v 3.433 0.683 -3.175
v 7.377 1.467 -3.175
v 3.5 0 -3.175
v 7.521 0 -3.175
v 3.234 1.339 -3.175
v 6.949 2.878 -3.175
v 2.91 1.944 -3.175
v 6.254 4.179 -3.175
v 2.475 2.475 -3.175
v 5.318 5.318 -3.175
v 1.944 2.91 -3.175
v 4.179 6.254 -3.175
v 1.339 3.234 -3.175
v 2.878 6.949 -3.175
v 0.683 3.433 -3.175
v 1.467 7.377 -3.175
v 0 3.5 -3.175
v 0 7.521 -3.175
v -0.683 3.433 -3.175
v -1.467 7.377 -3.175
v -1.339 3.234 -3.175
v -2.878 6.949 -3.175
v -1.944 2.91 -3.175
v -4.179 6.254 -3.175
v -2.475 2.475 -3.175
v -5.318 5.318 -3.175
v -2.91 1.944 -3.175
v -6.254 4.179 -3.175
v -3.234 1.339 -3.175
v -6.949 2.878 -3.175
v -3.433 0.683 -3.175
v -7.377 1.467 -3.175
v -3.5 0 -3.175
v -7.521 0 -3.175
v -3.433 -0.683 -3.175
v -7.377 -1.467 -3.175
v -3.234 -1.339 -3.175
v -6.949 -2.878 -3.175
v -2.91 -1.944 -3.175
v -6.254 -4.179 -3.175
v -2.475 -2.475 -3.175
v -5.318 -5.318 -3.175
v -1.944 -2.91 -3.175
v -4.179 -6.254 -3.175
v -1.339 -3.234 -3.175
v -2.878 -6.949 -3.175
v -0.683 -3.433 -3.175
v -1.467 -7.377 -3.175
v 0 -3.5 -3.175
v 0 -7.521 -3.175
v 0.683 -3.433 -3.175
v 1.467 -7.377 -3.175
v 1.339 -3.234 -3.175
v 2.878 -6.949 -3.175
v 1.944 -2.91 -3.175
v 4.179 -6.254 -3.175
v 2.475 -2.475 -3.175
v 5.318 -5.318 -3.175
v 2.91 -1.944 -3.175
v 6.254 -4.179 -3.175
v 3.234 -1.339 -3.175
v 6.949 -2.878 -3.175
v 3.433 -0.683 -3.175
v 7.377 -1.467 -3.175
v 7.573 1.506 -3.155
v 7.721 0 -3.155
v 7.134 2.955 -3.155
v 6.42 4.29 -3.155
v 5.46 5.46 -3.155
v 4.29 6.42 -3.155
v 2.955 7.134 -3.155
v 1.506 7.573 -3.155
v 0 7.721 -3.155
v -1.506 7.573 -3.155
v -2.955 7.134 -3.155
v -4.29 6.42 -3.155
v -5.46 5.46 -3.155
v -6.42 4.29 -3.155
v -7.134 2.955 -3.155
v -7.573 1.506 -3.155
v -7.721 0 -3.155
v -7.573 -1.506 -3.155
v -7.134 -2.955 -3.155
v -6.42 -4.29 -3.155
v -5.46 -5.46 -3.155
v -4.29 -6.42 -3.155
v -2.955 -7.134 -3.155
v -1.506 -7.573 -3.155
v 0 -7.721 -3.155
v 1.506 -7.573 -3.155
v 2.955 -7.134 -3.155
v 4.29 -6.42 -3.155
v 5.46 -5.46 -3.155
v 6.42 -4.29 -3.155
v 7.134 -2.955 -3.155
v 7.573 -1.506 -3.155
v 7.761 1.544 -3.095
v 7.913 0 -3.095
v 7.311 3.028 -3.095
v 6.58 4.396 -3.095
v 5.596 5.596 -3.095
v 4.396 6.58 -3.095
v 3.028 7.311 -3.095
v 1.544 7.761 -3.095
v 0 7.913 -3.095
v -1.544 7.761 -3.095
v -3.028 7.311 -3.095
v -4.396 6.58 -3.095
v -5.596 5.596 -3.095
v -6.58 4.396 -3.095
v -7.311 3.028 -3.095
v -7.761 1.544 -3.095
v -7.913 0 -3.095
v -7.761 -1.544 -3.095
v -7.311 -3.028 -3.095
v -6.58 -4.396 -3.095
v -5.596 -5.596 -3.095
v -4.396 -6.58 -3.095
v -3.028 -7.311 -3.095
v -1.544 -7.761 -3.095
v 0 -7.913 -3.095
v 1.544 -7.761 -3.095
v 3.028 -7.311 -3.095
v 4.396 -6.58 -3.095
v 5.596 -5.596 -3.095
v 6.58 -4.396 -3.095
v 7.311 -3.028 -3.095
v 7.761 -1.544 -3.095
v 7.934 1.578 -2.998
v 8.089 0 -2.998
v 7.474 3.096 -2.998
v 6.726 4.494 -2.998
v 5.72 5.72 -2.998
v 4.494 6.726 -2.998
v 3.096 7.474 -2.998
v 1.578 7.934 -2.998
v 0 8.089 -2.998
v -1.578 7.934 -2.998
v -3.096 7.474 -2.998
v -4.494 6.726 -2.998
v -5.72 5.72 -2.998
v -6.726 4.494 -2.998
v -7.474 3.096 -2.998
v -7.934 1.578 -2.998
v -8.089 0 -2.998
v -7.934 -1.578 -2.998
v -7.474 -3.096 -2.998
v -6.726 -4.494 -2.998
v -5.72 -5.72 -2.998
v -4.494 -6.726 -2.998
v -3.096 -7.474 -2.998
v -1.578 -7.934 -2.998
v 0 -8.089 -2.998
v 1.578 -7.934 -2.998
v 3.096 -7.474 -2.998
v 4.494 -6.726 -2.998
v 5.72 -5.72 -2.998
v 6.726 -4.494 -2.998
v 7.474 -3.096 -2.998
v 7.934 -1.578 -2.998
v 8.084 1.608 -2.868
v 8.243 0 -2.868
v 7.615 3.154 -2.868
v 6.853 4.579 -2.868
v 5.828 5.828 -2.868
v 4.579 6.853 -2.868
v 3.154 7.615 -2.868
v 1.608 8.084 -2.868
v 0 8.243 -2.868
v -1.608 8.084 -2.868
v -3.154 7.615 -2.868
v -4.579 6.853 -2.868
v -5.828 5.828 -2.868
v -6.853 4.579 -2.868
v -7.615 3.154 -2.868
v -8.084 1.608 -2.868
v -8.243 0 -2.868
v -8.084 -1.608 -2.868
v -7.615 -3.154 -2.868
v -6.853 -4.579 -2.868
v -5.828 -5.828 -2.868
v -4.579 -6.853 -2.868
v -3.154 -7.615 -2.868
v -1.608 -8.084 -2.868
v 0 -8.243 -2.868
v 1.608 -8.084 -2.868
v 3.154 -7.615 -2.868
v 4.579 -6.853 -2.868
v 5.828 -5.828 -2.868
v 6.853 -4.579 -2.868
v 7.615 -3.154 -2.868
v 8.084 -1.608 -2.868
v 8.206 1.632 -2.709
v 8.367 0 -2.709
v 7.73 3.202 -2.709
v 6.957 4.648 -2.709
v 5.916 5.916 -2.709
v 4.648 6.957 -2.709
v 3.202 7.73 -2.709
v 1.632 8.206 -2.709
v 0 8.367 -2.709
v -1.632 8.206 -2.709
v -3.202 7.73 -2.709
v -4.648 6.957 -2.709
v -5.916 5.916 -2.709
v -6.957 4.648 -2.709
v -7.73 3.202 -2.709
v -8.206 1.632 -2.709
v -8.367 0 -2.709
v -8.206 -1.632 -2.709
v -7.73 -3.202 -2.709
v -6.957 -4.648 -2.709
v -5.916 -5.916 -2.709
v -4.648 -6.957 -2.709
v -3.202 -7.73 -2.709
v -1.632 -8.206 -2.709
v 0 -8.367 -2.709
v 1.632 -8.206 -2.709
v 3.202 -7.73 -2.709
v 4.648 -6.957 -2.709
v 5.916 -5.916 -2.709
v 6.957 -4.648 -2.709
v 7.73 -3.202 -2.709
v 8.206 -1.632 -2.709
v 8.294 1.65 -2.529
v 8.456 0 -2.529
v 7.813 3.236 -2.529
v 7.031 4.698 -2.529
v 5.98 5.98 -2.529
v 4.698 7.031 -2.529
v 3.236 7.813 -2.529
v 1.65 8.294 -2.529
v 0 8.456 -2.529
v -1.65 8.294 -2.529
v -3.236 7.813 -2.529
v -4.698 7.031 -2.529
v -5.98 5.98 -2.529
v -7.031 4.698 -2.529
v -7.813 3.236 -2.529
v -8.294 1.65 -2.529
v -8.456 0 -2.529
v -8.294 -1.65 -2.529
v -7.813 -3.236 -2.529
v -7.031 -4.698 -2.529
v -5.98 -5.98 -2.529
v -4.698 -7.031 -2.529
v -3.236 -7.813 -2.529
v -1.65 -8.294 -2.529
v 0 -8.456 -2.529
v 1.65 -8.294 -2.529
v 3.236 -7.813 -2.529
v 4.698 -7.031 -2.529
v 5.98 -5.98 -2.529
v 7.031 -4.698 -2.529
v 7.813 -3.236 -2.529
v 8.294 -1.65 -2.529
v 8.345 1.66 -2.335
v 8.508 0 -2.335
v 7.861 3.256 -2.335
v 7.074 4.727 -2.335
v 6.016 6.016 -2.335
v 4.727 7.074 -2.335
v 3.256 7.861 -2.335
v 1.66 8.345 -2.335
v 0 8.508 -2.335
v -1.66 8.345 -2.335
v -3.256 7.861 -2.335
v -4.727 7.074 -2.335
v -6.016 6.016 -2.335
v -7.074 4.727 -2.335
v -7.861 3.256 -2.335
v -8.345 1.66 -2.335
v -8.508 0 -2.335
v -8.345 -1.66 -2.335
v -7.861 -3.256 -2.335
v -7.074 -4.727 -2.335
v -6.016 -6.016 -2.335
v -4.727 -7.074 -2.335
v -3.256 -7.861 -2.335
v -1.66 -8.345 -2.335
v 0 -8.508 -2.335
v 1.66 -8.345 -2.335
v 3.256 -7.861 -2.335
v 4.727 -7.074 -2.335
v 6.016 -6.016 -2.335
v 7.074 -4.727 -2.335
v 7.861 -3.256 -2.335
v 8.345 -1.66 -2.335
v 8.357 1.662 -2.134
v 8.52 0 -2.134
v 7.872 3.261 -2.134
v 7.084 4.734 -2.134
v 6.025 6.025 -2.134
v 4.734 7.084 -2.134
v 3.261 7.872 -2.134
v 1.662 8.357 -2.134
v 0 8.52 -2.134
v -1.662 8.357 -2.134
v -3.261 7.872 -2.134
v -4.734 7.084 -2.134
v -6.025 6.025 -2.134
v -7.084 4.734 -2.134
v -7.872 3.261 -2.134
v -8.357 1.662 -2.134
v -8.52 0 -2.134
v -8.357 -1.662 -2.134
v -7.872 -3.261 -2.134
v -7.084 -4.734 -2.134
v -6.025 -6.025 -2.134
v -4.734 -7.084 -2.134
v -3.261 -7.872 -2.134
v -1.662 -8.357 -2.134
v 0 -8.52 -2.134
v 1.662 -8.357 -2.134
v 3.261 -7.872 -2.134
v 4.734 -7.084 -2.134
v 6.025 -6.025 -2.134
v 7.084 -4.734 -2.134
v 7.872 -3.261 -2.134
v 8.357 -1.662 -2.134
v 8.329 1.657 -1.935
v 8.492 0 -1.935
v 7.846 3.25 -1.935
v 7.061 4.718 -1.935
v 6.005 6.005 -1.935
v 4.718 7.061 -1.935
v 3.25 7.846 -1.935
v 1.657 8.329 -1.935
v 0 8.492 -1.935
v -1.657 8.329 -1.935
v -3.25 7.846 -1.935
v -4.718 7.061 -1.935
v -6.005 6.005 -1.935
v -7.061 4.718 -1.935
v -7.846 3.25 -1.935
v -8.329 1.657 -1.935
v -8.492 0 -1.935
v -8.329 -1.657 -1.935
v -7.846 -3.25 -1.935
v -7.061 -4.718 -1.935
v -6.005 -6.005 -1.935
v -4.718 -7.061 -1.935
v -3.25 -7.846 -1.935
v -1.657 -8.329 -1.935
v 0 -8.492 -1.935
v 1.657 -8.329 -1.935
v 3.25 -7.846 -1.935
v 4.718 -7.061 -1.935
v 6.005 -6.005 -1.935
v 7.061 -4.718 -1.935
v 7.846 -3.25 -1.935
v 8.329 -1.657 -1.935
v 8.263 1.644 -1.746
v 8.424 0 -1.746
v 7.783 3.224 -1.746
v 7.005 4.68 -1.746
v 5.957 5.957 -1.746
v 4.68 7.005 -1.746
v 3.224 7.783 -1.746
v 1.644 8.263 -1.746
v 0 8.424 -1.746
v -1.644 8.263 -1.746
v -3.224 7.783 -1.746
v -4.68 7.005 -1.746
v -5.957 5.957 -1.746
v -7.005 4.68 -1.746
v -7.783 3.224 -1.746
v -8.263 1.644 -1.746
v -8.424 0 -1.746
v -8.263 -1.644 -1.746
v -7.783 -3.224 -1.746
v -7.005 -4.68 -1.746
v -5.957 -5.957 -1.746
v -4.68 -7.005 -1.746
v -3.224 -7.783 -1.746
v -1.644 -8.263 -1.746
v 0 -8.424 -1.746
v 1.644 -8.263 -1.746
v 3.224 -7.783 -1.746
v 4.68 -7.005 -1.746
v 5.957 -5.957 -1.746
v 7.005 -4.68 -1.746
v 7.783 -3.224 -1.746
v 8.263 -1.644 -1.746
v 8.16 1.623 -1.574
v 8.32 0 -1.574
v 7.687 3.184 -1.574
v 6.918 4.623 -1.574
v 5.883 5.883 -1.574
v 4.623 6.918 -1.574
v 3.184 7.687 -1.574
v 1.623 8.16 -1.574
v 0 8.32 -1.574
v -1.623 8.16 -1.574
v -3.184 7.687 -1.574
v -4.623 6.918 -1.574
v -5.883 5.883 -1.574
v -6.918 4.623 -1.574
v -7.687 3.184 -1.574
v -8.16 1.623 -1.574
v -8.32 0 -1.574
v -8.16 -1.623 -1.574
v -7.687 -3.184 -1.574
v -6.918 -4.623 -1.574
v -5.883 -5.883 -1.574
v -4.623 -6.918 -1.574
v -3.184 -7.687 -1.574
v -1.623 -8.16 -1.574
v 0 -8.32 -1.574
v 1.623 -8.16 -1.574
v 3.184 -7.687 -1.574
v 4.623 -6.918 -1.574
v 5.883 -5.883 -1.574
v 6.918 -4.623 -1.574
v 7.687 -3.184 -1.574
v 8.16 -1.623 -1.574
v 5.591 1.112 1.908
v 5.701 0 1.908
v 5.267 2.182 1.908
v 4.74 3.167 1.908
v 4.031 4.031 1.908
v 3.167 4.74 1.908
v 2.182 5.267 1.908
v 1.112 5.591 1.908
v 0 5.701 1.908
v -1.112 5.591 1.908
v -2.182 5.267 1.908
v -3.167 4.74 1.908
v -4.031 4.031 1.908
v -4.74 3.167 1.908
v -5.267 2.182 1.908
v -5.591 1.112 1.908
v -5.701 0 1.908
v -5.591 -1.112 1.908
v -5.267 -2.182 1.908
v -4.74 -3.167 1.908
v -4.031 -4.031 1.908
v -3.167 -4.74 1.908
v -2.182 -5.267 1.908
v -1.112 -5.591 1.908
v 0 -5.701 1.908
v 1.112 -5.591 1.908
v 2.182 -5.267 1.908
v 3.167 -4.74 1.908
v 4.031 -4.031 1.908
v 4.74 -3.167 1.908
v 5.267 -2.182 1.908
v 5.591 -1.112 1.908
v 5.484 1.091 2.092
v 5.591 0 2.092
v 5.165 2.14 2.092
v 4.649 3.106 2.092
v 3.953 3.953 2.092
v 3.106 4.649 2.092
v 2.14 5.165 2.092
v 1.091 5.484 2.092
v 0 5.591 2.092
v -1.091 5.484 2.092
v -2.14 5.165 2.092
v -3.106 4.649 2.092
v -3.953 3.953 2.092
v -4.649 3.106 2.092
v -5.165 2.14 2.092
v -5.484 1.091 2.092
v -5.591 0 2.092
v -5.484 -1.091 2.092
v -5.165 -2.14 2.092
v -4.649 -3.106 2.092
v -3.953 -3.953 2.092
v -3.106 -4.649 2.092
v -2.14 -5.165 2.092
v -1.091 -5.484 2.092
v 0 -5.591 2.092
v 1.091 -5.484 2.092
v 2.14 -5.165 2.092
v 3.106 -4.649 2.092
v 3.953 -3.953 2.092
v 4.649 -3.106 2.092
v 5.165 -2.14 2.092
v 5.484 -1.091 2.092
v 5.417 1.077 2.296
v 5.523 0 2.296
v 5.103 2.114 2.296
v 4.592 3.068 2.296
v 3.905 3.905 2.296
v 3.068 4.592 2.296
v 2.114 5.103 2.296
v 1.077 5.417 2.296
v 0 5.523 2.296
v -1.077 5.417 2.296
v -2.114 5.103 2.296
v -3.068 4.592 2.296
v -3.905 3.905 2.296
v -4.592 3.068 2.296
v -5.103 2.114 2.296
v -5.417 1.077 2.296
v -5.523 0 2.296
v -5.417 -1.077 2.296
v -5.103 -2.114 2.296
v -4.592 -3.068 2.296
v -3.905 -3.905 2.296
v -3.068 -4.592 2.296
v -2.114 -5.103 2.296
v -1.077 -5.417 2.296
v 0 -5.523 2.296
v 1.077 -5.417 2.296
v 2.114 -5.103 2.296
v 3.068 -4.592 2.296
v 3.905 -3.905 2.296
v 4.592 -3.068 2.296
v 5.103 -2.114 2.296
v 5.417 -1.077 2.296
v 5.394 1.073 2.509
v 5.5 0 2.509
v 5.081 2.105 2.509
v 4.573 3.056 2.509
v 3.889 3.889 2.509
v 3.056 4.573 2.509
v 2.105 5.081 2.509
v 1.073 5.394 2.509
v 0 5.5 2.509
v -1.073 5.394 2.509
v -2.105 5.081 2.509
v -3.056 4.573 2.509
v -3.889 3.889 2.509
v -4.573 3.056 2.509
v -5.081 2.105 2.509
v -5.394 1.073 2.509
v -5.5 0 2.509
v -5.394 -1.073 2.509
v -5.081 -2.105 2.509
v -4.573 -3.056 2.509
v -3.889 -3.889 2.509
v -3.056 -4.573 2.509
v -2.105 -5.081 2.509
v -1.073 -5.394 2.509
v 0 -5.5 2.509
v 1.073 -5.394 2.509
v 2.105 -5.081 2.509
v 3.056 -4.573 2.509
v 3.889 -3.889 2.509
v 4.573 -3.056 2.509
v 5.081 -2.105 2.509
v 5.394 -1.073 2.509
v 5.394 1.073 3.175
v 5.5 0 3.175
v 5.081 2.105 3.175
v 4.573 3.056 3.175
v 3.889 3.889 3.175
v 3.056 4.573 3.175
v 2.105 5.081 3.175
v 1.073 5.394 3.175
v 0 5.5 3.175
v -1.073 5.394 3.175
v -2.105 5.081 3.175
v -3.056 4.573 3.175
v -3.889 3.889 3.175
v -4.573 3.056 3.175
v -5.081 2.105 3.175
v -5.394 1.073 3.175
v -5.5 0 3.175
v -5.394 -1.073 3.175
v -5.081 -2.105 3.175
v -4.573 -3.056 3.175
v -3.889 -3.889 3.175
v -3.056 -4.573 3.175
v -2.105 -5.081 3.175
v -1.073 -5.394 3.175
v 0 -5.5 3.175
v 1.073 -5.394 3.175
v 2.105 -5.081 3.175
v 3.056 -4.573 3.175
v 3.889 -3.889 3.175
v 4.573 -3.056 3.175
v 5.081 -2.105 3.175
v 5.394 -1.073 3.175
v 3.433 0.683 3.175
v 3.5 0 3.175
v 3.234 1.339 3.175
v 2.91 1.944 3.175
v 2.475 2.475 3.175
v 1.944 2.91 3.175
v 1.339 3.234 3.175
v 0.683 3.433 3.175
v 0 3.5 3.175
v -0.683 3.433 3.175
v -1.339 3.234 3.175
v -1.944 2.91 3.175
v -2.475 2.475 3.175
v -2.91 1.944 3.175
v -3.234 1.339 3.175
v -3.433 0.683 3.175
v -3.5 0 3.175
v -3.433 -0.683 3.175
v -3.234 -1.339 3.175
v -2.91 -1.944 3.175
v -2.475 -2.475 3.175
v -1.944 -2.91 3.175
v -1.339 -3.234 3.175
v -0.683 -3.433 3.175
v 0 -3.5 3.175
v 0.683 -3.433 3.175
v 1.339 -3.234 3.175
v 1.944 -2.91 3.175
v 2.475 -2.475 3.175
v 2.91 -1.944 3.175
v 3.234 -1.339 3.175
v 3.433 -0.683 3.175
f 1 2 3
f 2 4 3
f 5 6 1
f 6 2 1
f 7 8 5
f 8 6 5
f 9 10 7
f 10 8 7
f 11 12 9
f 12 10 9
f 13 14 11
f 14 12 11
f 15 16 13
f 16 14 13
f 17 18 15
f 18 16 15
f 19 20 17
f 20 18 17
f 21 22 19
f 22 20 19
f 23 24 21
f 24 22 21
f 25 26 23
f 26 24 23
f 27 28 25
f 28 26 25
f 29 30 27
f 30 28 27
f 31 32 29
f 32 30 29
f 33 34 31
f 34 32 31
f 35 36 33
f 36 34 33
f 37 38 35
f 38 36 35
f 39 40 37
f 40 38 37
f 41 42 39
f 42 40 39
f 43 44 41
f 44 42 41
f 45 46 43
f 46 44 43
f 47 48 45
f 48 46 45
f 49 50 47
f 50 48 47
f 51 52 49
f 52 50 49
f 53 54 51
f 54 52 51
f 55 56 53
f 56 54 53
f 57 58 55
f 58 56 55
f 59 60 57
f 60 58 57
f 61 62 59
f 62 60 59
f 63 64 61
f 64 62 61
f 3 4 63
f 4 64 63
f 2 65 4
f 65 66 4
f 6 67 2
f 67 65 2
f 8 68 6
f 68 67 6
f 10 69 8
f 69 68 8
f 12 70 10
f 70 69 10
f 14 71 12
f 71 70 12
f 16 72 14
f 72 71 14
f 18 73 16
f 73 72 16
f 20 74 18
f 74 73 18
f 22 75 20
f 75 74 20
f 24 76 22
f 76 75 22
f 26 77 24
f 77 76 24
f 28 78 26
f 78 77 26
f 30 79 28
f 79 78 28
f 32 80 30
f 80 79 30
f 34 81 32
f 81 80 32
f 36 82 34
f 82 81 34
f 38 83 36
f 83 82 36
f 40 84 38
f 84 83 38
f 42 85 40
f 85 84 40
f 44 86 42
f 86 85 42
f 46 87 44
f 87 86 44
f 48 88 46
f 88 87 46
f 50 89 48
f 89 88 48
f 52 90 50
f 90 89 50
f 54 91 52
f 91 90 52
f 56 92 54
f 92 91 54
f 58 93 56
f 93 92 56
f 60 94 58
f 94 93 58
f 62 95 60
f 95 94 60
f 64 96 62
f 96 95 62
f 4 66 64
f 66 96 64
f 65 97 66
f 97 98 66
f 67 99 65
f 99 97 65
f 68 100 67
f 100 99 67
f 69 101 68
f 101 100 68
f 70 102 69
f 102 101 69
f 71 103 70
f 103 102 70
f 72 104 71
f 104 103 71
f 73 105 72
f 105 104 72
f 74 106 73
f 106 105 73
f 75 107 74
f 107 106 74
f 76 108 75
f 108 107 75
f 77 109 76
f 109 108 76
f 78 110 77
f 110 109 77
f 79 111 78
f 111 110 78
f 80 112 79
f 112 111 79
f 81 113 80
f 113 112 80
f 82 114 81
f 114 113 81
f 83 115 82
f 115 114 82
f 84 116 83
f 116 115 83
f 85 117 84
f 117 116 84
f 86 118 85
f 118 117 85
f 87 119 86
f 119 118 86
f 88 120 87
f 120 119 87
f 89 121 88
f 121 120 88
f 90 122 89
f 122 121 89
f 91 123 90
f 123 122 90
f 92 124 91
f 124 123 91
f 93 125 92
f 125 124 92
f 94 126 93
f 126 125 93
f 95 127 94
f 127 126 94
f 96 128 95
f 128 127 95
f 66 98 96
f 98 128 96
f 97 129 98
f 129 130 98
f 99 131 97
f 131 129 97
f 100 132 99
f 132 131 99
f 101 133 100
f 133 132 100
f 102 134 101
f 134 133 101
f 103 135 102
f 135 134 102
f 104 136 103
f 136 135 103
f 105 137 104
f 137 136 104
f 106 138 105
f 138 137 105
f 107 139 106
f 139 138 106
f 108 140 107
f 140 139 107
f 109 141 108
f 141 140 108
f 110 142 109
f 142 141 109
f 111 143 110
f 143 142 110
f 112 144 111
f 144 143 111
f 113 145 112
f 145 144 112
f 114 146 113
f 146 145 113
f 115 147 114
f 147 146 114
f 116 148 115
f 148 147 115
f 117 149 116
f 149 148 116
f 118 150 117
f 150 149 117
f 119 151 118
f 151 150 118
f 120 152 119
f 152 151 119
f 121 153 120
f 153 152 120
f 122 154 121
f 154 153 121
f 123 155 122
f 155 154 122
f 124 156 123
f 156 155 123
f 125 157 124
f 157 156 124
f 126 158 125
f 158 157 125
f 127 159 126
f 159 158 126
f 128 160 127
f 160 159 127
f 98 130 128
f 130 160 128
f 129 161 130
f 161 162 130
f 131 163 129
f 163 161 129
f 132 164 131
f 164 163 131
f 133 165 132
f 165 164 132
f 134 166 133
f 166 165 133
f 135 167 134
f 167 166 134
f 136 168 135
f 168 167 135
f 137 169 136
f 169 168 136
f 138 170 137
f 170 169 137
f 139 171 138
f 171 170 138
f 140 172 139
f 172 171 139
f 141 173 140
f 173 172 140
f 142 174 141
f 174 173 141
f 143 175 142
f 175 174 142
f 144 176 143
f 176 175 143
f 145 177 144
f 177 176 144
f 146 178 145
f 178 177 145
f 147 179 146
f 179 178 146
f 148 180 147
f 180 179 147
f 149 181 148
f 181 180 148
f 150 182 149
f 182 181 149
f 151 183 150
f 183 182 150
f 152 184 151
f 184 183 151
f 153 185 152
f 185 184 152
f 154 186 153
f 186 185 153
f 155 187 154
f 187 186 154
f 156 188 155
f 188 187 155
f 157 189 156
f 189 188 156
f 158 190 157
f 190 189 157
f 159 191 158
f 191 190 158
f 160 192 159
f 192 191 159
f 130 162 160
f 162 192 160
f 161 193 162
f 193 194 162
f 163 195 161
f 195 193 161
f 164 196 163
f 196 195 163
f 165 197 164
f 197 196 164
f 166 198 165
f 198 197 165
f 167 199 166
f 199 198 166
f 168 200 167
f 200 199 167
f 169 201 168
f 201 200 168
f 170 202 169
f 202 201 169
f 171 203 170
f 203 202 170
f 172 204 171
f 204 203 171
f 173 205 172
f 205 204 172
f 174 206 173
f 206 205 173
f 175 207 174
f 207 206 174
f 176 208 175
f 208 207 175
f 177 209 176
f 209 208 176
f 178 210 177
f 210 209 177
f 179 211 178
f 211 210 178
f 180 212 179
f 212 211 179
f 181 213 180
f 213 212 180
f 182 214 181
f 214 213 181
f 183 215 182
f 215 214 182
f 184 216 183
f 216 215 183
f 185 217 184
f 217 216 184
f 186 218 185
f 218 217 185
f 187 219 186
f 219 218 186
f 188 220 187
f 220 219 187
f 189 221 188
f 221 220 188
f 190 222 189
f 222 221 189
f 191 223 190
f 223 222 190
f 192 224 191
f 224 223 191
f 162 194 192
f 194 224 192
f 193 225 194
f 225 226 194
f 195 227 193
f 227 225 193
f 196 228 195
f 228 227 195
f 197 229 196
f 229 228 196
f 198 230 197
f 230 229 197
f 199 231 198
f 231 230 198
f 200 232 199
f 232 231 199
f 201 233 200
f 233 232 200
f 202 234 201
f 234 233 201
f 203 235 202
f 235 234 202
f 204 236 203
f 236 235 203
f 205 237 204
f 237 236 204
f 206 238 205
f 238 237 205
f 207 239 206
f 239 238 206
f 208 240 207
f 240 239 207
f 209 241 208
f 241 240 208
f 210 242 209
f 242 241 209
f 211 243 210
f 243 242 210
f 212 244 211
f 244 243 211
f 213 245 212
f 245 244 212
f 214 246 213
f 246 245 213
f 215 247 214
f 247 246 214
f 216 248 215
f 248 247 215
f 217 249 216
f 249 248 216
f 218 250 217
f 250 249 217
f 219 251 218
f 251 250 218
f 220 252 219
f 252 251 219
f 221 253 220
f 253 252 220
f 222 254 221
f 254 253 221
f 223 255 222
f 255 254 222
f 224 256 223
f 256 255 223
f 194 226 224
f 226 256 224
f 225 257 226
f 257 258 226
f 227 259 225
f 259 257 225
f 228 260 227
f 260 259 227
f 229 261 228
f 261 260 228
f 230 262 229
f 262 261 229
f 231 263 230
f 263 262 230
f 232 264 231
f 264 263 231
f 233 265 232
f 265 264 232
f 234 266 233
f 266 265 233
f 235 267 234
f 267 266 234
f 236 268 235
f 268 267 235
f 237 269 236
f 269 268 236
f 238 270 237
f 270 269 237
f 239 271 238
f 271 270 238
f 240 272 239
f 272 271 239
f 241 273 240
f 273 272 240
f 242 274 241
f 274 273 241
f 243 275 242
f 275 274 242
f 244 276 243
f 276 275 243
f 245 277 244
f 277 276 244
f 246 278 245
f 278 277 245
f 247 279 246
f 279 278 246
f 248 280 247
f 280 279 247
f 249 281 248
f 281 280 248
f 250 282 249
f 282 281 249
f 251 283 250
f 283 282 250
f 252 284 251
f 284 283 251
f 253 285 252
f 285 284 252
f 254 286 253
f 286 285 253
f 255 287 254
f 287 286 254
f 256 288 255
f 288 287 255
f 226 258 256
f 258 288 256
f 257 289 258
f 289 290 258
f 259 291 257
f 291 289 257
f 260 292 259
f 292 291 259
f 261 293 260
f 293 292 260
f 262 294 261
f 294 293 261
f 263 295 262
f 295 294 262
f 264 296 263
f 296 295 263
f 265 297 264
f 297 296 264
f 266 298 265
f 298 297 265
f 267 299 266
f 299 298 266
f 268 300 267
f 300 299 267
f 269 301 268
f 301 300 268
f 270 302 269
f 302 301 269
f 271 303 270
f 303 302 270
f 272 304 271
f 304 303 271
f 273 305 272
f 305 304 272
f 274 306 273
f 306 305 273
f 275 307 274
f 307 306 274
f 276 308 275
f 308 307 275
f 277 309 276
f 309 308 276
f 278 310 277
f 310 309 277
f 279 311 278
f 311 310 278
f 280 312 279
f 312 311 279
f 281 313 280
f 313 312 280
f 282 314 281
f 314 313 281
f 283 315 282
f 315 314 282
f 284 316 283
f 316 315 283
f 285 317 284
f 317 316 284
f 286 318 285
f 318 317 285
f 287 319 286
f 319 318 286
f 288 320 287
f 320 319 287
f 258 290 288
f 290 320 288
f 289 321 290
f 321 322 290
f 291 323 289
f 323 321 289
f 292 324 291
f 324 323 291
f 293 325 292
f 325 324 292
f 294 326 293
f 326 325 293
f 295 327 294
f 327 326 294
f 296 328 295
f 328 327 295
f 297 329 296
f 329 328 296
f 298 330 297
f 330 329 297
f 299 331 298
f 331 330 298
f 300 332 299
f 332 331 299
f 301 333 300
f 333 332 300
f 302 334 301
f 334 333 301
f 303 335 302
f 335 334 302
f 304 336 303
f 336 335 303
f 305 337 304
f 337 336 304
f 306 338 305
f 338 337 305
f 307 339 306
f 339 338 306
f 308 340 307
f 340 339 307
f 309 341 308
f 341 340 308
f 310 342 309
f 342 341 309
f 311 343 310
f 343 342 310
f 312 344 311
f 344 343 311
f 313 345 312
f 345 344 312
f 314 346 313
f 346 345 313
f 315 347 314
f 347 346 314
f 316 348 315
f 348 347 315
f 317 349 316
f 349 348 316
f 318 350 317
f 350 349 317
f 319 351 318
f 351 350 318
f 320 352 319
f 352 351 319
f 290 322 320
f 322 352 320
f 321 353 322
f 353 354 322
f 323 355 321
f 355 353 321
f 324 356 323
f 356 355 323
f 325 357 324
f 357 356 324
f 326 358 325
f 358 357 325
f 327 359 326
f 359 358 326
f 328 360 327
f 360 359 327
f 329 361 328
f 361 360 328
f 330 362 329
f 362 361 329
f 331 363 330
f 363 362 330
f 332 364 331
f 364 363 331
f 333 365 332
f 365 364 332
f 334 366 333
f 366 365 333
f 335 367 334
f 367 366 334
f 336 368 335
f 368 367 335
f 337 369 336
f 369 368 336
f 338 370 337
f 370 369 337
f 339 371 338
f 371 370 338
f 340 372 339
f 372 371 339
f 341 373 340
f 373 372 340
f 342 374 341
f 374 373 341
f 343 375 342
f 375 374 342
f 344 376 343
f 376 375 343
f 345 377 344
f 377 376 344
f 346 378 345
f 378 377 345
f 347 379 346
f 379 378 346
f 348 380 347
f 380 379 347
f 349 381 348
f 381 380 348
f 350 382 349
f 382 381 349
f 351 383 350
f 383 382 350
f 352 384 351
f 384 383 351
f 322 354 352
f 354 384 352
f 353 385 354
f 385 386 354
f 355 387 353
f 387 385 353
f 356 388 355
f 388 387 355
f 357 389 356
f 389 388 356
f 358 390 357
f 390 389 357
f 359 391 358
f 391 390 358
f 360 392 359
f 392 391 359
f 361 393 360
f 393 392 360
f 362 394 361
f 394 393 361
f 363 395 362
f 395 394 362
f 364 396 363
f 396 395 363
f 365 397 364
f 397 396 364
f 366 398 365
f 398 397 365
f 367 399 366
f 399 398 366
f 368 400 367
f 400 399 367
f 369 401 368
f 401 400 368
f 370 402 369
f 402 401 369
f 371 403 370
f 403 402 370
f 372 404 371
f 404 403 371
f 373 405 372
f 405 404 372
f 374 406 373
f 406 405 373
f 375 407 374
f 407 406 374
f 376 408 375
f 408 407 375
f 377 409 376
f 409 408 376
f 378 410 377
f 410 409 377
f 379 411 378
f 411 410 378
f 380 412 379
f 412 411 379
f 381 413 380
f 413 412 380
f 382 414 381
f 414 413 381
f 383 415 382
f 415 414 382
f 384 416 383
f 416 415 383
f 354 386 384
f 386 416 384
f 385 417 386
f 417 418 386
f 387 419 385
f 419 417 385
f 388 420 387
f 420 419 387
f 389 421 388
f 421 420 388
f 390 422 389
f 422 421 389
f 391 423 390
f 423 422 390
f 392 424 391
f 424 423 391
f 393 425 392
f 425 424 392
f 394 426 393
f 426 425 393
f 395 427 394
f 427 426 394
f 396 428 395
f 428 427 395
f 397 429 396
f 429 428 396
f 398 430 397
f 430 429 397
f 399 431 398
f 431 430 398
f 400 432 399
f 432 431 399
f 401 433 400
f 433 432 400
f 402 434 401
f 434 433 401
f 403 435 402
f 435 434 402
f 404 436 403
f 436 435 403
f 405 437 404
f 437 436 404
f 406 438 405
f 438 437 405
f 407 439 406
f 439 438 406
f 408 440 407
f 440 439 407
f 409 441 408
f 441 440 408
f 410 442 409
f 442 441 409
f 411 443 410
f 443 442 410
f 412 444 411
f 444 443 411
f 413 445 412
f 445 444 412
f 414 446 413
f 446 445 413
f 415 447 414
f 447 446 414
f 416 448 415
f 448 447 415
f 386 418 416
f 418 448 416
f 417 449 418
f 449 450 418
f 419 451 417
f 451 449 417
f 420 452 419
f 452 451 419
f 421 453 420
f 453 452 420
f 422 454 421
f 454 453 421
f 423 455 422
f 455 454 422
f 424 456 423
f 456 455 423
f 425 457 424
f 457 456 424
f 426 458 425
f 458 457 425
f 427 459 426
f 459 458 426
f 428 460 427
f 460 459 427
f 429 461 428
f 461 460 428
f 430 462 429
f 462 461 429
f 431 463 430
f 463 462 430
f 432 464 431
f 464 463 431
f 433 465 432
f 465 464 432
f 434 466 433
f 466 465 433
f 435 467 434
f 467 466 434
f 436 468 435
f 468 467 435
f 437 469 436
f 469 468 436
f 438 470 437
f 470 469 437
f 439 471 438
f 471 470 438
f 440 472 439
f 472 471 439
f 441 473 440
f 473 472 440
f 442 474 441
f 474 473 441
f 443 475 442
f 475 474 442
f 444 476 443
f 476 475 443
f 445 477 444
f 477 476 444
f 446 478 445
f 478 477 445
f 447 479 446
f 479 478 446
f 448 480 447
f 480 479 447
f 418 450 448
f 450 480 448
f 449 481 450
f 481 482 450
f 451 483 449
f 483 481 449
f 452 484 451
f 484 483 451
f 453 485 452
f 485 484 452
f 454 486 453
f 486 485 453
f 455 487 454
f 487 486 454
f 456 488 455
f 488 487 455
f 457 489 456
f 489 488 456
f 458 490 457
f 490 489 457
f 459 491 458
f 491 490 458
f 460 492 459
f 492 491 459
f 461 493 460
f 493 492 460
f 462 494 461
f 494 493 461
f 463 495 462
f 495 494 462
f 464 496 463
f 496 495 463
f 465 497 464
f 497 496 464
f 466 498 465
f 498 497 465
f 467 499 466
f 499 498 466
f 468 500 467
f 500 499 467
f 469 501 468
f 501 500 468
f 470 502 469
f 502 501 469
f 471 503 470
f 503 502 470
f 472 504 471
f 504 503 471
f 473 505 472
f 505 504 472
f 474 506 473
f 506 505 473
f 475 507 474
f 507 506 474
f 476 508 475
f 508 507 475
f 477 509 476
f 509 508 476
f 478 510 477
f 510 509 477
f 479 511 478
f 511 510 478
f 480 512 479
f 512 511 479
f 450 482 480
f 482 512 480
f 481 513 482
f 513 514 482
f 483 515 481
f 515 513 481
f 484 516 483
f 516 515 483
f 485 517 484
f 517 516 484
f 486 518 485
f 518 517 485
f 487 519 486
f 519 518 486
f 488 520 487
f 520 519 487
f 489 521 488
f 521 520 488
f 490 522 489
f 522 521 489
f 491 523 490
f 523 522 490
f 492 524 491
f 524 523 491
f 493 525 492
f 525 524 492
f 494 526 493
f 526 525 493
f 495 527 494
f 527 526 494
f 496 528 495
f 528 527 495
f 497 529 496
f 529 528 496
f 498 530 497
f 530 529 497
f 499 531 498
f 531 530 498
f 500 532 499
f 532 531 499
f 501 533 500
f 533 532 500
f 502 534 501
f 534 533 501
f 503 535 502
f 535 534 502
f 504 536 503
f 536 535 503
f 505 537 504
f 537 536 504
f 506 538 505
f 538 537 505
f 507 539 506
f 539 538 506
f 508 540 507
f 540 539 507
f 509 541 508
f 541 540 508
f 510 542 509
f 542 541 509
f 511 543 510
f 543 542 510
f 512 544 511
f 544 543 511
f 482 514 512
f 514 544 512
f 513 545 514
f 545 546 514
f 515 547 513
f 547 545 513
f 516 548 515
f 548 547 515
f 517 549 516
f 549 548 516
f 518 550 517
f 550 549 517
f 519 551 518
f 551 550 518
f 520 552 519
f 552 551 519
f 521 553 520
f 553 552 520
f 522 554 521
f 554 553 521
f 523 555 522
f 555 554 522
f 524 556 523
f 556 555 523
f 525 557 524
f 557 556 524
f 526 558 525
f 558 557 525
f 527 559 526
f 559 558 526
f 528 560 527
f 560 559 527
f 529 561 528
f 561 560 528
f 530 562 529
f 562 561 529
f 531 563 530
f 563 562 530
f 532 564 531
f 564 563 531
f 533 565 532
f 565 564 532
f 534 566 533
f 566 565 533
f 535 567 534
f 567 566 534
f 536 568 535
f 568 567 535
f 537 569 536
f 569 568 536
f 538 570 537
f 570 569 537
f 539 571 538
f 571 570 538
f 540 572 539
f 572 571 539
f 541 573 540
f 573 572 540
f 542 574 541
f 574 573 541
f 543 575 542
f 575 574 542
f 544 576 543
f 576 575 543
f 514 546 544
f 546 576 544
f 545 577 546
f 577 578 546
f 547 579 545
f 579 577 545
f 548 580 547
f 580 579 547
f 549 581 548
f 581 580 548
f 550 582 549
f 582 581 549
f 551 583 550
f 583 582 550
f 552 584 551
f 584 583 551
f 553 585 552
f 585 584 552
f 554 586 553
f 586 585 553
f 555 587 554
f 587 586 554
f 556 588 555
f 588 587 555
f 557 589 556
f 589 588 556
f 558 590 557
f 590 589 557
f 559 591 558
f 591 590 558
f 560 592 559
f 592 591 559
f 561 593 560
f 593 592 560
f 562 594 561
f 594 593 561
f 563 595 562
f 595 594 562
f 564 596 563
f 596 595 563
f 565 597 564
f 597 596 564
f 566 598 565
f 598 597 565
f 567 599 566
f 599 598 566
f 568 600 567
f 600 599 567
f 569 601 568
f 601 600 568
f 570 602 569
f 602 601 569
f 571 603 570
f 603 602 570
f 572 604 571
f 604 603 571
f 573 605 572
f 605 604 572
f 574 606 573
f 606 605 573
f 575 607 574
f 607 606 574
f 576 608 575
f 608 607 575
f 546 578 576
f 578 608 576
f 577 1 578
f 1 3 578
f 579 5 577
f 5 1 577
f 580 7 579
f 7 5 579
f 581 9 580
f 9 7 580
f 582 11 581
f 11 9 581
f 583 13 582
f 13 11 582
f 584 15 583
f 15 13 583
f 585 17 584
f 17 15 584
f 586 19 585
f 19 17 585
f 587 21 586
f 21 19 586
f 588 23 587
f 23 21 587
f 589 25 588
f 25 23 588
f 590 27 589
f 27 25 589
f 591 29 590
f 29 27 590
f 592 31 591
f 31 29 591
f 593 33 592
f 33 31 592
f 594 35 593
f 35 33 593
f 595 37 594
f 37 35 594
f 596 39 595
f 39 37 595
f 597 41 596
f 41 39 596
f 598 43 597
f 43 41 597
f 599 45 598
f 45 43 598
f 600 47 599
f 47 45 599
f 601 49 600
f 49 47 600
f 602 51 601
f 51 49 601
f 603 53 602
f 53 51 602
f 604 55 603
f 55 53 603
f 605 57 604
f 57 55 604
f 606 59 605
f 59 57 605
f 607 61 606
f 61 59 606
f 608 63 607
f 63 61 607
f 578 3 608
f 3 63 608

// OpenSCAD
// FCWheelSpacer1.0
// 
// Spacer to go around your FCWheel1

total_height  = "1/4inch";
neck_diameter = "11mm";
neck_height   = "1mm";
bore_diameter = "7mm";
foot_diameter = "3/4inch";

$fn = 32;

module __fcwheel1__end_params() { }

use <../lib/TOGMod1.scad>
use <../lib/TOGPath1.scad>
use <../lib/TOGPolyhedronLib1.scad>
use <../lib/TOGUnits1.scad>

total_height_mm  = togunits1_to_mm(total_height );
neck_diameter_mm = togunits1_to_mm(neck_diameter);
neck_height_mm   = togunits1_to_mm(neck_height  );
bore_diameter_mm = togunits1_to_mm(bore_diameter);
foot_diameter_mm = togunits1_to_mm(foot_diameter);

bot_z = -total_height_mm/2;
top_z =  total_height_mm/2;
nk_z0 = top_z - neck_height_mm;

function make_the_spacer() =
tphl1_make_z_cylinder(
	zrs = togpath1_rath_to_polypoints(["togpath1-rath",
		["togpath1-rathnode", [            bot_z  , bore_diameter_mm/2]],
		
		["togpath1-rathnode", [            bot_z  , foot_diameter_mm/2], ["round", 1]], // TODO: Min with length of adjacent lines
		if( neck_height_mm > 0 )
		["togpath1-rathnode", [            nk_z0  , neck_diameter_mm/2], ["round", neck_height_mm]],
		["togpath1-rathnode", [            top_z  , neck_diameter_mm/2]],
		["togpath1-rathnode", [            top_z  , bore_diameter_mm/2]],
		
		["togpath1-rathnode", [            bot_z  , bore_diameter_mm/2]],
	], $fn=min(32,$fn)),
	cap_top = false,
	cap_bottom = false
);

togmod1_domodule(make_the_spacer());
